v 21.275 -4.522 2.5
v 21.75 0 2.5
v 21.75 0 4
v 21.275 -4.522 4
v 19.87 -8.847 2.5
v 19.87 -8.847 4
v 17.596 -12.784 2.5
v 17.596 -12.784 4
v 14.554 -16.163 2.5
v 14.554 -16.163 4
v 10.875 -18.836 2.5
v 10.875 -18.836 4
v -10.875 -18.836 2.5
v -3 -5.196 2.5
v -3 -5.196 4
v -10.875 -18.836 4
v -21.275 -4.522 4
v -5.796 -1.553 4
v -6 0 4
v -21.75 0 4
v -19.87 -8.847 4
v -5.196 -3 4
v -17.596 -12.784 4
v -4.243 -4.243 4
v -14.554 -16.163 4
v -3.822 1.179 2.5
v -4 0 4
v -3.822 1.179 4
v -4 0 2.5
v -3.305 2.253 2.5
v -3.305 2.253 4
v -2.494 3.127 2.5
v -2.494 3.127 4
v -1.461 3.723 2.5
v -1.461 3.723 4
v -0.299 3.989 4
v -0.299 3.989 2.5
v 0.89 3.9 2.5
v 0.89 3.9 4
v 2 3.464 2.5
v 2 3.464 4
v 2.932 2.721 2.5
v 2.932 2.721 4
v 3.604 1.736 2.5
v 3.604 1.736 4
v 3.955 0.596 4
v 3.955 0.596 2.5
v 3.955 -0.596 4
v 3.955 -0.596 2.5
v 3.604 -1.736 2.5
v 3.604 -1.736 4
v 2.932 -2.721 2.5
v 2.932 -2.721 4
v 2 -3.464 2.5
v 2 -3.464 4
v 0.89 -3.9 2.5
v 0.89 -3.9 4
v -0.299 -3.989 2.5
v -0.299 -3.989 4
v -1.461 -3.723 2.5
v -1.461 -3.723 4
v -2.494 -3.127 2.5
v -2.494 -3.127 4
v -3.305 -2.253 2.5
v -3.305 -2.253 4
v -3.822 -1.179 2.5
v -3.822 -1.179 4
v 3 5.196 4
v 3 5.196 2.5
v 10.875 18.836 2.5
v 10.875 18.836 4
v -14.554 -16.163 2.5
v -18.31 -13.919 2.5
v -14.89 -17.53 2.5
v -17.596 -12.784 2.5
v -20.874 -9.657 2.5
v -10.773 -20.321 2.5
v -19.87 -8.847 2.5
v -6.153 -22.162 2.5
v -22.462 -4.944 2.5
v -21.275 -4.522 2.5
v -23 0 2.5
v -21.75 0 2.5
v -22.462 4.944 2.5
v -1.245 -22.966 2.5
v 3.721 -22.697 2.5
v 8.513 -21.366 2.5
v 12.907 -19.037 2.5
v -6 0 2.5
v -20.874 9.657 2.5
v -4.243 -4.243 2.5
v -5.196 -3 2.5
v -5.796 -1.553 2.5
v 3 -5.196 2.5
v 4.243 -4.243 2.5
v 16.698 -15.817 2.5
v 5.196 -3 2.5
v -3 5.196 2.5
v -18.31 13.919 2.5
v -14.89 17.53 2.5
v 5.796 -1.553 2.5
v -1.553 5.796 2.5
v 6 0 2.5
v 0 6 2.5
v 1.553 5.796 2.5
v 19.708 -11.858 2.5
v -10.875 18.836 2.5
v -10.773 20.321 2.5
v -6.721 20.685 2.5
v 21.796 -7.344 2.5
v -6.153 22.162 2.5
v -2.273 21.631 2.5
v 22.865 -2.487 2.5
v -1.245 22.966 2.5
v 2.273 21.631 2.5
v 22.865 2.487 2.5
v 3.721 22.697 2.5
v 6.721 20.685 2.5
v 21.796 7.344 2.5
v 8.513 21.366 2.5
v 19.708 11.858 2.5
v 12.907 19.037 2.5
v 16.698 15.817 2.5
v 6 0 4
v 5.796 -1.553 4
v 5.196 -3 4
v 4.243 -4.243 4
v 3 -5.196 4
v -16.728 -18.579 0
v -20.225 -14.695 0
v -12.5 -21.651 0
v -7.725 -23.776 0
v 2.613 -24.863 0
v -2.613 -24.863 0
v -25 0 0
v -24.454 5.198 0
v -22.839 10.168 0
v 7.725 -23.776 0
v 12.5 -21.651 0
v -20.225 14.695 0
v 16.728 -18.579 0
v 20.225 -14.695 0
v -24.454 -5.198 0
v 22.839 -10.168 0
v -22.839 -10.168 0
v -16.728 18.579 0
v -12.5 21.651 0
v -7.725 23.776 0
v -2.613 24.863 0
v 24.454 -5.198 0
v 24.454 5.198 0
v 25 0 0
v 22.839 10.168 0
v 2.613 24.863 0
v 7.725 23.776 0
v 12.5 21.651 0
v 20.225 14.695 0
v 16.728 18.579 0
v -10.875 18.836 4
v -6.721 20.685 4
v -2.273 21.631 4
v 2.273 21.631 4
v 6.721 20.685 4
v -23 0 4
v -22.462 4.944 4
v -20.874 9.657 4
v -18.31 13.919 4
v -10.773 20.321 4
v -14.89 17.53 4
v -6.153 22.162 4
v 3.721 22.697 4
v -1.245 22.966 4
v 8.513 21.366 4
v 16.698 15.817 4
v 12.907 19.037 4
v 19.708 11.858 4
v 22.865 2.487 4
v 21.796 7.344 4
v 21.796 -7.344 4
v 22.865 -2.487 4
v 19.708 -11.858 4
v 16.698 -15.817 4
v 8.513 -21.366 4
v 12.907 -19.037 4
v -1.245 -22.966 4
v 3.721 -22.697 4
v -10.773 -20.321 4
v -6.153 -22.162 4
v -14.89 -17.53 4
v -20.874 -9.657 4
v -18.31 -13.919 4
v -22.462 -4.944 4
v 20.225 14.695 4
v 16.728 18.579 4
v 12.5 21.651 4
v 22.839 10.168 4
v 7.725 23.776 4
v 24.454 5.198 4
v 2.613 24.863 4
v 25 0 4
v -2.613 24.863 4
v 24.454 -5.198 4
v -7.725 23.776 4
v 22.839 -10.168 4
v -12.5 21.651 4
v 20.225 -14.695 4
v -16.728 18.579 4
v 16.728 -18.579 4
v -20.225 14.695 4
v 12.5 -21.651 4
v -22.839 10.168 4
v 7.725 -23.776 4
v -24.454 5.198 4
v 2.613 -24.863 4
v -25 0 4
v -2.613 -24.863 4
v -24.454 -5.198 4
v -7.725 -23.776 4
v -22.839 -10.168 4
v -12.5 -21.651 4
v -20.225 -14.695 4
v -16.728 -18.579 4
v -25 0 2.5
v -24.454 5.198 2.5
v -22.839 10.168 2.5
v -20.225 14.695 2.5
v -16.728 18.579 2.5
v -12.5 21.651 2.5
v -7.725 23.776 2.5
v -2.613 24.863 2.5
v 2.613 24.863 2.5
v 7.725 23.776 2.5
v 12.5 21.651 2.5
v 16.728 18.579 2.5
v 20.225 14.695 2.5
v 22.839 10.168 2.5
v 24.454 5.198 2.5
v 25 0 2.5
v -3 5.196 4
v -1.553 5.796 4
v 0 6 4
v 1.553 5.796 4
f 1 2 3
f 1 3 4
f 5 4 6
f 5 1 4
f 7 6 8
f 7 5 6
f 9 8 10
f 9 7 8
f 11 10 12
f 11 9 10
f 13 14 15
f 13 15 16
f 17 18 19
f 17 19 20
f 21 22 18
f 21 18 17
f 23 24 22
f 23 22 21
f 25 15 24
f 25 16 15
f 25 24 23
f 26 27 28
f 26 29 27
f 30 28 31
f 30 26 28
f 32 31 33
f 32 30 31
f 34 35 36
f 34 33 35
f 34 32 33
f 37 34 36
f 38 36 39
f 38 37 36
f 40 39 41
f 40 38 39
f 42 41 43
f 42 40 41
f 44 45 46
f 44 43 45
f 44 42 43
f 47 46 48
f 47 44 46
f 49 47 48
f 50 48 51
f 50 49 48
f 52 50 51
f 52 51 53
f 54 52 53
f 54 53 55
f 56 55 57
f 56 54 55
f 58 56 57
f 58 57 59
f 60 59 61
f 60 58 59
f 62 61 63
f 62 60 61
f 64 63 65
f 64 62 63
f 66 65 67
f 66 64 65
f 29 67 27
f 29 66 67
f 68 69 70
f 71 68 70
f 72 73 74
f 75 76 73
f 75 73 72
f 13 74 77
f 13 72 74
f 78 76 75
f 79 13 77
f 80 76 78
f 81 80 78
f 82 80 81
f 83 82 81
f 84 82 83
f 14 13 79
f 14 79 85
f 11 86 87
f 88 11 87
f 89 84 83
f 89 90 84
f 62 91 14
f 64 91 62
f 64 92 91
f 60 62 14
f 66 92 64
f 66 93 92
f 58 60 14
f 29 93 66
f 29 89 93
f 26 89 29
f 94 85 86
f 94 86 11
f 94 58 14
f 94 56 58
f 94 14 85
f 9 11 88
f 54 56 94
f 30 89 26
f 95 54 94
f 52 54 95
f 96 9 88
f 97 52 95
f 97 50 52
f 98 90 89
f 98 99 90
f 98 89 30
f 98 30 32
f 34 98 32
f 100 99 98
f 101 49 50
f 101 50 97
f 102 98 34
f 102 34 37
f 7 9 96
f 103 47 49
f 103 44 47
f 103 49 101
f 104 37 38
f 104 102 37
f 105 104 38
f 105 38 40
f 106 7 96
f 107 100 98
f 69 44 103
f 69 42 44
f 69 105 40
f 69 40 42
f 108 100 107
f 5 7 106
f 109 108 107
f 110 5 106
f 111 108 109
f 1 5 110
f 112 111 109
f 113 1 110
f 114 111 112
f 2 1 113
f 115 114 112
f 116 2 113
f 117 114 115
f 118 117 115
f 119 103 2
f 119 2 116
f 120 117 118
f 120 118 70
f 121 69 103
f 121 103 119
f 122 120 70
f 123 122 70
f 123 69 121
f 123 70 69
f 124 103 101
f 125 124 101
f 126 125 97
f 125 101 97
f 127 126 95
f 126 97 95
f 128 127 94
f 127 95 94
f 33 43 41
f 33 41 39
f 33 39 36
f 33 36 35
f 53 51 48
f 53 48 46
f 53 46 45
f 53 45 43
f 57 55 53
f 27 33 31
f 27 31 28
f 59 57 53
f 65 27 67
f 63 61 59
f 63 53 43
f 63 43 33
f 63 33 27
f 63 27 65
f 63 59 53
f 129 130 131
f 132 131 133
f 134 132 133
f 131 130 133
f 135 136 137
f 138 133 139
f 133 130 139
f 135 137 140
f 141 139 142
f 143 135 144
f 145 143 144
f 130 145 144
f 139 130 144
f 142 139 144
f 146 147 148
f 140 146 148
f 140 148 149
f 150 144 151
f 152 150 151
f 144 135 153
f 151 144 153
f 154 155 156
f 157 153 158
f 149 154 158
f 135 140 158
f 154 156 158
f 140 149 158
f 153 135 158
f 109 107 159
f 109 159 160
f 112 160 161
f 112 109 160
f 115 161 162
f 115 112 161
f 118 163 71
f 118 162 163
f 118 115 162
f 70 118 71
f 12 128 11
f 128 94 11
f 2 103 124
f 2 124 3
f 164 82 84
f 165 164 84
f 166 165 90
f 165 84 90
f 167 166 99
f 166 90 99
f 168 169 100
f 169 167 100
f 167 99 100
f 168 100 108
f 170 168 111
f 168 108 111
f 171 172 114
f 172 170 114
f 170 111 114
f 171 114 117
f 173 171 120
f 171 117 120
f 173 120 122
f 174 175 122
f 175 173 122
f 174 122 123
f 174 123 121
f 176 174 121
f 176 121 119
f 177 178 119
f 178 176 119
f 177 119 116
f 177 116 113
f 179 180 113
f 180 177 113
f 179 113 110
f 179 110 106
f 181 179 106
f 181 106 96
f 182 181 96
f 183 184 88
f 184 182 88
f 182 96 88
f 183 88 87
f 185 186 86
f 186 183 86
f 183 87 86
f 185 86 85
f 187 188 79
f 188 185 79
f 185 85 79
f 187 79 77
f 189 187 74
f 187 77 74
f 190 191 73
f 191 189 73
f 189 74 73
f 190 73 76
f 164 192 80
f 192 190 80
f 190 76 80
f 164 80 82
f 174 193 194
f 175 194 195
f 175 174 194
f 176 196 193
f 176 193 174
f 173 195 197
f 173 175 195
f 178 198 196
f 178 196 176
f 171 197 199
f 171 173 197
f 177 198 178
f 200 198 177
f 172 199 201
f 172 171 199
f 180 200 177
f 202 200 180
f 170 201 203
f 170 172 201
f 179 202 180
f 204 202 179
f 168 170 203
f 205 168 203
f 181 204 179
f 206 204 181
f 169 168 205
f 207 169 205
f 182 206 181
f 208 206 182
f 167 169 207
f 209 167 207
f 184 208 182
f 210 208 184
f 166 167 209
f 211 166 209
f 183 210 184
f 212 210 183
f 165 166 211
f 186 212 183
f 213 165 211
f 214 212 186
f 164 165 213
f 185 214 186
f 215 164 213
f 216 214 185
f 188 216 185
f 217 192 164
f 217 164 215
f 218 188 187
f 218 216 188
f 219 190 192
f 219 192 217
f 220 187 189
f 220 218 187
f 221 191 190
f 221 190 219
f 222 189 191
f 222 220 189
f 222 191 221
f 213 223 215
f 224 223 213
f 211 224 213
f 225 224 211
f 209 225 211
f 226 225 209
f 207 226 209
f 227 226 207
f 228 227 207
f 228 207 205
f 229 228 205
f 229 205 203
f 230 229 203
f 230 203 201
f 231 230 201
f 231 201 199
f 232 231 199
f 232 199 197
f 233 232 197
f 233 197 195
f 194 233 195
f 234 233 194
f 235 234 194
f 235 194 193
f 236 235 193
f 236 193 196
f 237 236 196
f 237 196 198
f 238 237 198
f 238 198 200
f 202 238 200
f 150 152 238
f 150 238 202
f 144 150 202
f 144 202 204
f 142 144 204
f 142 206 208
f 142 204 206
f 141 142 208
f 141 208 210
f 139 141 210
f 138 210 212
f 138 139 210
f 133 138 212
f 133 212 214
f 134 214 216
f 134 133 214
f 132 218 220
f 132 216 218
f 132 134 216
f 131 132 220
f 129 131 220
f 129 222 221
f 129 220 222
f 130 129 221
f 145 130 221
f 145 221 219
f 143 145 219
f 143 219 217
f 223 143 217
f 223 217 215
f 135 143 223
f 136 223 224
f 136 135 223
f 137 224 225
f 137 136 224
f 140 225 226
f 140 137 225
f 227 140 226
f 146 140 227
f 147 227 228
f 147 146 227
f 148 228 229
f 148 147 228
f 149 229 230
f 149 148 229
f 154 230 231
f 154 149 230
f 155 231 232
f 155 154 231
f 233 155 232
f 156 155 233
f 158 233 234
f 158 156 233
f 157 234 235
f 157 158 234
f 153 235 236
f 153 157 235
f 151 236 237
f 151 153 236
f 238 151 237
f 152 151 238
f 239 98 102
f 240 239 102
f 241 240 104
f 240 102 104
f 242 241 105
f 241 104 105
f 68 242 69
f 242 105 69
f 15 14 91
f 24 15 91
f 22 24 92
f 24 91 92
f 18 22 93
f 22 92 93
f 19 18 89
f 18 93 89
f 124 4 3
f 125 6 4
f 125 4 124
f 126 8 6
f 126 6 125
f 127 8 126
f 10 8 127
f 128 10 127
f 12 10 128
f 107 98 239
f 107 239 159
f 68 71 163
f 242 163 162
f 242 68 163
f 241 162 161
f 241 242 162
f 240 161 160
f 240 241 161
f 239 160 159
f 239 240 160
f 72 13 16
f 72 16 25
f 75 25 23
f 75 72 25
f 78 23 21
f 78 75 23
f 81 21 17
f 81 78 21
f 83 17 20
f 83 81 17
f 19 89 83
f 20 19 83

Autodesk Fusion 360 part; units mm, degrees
sketch "Sketch1" plane through (0, 0, 0) normal (0, 0, 1) x (1, 0, 0)
  circle A0 centre (0, 0) radius 25
  dimension "d1" = 50
extrude "Extrude1" add sketch "Sketch1" along normal blind 2.5
sketch "Sketch2" plane through (0, 0, 2.5) normal (0, 0, 1) x (-1, 0, 0)
  circle A0 centre (0, 0) radius 25
  circle A1 centre (0, 0) radius 4
  line L0 (-6, 0) -> (-3, -5.1962) construction
  line L1 (-3, -5.1962) -> (3, -5.1962) construction
  line L2 (3, -5.1962) -> (6, 0) construction
  line L3 (6, 0) -> (3, 5.1962) construction
  line L4 (3, 5.1962) -> (-3, 5.1962) construction
  line L5 (-3, 5.1962) -> (-6, 0) construction
  circle A2 centre (0, 0) radius 21.75
  line L6 (-6, 0) -> (-21.75, 0)
  line L7 (6, 0) -> (21.75, 0)
  line L8 (-3, -5.1962) -> (-10.875, -18.8361)
  line L9 (3, -5.1962) -> (10.875, -18.8361)
  line L10 (-10.875, -18.8361) -> (-21.75, 0) construction
  line L11 (10.875, -18.8361) -> (21.75, 0) construction
  line L12 (-3, 5.1962) -> (-10.875, 18.8361)
  line L13 (3, 5.1962) -> (10.875, 18.8361)
  line L14 (10.875, 18.8361) -> (-10.875, 18.8361) construction
  line L15 (-21.75, 0) -> (-10.875, 18.8361) construction
  line L16 (-10.875, -18.8361) -> (10.875, -18.8361) construction
  circle A3 centre (0, 0) radius 6
  circle A4 centre (0, 0) radius 23
  dimension "d4" = 8
  dimension "d5" = 6
  dimension "d6" = 43.5
  dimension "d7" = 46
extrude "Extrude3" add sketch "Sketch2" along normal blind 1.5 contours A0 | A1 | A2 L7 L13 A3 | A2 L8 L9 A3 | A2 L6 L12 A3
